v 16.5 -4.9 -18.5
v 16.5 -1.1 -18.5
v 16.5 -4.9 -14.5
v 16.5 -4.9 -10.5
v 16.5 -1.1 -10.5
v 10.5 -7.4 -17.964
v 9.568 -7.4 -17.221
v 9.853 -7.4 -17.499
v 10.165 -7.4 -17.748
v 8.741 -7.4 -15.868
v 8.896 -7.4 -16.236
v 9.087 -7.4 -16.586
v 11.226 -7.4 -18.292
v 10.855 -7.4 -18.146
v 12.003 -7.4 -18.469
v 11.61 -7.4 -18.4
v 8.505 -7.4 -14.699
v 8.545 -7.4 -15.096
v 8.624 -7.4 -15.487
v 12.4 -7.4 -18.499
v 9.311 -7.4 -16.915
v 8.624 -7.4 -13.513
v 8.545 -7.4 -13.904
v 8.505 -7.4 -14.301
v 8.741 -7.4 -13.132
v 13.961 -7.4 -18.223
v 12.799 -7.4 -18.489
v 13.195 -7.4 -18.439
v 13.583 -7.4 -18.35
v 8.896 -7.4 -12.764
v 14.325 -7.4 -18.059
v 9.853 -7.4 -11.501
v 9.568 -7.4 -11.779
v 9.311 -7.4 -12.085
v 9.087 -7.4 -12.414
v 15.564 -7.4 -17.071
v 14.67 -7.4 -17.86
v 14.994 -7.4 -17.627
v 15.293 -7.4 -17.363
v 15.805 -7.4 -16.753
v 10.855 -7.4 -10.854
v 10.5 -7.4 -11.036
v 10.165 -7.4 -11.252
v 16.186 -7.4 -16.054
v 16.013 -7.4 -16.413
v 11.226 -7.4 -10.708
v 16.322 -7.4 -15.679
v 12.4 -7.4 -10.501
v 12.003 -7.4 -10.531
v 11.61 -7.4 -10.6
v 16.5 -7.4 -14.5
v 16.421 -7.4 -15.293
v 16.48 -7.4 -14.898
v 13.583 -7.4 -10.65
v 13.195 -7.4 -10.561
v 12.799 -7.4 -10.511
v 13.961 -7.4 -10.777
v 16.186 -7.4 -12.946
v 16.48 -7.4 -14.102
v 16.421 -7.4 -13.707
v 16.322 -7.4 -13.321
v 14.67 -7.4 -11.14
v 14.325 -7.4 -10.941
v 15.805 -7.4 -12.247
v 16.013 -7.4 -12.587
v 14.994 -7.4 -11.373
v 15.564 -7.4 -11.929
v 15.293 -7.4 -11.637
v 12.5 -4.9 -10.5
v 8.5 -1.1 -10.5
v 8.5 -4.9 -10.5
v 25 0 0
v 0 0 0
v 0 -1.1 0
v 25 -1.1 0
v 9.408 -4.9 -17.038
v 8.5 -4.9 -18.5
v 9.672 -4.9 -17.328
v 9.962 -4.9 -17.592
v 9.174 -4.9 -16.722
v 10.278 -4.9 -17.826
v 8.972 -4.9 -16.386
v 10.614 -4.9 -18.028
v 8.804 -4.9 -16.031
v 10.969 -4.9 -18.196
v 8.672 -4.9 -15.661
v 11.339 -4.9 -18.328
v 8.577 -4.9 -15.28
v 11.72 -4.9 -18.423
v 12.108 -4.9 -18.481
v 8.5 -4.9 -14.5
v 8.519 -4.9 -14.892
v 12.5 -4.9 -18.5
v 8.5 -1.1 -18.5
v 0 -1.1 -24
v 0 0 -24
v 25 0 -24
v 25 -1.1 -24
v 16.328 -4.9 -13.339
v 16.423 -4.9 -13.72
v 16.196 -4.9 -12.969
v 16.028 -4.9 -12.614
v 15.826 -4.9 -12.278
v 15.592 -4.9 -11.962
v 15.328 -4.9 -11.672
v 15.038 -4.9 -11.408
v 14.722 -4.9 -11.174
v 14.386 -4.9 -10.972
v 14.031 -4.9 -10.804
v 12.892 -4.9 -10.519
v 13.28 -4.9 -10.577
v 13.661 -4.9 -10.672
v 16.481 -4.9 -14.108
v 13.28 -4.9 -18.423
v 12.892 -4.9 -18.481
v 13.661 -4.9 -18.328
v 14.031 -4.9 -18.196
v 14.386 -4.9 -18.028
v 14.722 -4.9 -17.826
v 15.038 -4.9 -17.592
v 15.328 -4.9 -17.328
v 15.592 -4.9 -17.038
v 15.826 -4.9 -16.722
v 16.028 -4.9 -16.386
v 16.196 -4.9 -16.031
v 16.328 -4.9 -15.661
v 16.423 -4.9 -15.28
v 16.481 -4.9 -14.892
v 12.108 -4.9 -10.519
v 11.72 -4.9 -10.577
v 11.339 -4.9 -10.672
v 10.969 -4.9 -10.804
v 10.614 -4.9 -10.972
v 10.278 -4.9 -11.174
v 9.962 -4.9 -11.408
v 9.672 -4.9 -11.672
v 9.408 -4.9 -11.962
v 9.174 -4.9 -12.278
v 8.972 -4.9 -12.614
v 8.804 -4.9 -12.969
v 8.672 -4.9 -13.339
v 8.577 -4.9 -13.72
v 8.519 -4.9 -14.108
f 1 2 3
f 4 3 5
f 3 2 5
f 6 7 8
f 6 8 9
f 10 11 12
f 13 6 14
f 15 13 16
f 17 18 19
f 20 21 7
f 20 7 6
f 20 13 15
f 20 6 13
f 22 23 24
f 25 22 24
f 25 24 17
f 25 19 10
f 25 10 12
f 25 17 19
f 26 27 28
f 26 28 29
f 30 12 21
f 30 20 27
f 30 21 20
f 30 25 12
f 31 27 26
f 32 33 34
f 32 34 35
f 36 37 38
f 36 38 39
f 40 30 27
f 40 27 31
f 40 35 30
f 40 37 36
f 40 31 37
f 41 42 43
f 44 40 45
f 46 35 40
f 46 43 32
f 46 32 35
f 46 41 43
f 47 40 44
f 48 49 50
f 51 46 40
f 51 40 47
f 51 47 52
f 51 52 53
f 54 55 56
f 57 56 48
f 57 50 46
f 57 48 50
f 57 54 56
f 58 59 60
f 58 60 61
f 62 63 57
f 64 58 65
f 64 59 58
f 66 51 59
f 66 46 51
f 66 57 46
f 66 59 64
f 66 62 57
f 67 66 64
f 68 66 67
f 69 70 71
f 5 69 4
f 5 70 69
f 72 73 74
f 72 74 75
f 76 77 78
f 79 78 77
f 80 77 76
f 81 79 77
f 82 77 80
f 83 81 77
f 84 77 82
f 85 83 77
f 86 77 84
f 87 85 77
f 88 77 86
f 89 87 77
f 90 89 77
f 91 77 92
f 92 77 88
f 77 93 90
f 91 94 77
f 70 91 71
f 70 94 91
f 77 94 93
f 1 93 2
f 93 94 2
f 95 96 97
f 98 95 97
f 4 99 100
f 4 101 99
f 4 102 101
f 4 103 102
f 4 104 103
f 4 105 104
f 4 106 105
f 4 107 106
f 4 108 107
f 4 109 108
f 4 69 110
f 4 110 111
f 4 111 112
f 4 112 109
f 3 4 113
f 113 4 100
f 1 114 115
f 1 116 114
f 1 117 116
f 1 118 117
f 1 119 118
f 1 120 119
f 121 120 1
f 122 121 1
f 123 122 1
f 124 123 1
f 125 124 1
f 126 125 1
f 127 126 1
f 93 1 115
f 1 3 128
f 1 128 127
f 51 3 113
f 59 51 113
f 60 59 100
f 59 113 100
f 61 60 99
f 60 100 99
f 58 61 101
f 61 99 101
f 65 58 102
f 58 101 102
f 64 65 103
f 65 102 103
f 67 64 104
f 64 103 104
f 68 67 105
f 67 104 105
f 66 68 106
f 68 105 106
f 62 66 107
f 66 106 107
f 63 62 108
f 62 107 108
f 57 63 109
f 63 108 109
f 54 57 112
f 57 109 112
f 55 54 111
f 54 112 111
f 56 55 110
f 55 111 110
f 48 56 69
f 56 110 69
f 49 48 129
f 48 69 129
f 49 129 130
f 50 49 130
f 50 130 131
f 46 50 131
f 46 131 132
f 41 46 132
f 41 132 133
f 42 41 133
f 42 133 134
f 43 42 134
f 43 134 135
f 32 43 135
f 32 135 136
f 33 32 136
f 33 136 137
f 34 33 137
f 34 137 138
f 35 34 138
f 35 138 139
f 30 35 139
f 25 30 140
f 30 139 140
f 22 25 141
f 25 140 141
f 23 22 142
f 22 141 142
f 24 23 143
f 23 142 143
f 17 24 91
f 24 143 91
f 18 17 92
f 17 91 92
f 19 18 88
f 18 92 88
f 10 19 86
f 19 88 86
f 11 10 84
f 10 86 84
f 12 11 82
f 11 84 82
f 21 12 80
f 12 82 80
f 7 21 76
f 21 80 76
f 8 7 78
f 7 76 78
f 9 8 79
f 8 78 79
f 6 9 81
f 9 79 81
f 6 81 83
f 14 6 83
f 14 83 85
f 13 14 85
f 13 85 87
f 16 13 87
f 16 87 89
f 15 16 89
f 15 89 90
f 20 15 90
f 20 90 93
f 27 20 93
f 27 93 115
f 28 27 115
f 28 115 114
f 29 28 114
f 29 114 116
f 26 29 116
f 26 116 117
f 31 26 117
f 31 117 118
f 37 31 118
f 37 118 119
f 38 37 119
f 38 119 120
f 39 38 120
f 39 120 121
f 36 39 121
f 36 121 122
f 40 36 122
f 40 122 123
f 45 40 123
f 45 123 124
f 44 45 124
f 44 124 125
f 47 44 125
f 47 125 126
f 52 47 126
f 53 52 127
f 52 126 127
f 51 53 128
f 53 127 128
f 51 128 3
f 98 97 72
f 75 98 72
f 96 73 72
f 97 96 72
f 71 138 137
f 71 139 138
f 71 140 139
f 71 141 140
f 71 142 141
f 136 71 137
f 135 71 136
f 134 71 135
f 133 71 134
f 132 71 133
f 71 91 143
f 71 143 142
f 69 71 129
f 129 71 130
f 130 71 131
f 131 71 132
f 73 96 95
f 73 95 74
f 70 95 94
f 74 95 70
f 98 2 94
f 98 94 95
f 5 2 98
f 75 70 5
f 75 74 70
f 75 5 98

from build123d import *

# Parameters (mm, degrees)
F0_W     = 25
F0_H     = 24
F1_DEPTH = 1.1
F2_W     = 8
F2_H     = 8
F3_DEPTH = 3.8
F4_R     = 4
F5_DEPTH = 2.5


with BuildPart() as f1:
    # F0 (on Front) → F1 (new body)
    with BuildSketch(Plane.XZ):
        with Locations((12.5, -12)):
            Rectangle(F0_W, F0_H)
    extrude(amount=F1_DEPTH)

    # F2 (on face) → F3 (join)
    with BuildSketch(Plane.XZ.offset(1.1)):
        with Locations((12.5, -14.5)):
            Rectangle(F2_W, F2_H)
    extrude(amount=F3_DEPTH)

    # F4 (on face) → F5 (join)
    with BuildSketch(Plane.XZ.offset(4.9)):
        with Locations((12.5, -14.5)):
            Circle(F4_R)
    extrude(amount=F5_DEPTH)


solid = f1.part
